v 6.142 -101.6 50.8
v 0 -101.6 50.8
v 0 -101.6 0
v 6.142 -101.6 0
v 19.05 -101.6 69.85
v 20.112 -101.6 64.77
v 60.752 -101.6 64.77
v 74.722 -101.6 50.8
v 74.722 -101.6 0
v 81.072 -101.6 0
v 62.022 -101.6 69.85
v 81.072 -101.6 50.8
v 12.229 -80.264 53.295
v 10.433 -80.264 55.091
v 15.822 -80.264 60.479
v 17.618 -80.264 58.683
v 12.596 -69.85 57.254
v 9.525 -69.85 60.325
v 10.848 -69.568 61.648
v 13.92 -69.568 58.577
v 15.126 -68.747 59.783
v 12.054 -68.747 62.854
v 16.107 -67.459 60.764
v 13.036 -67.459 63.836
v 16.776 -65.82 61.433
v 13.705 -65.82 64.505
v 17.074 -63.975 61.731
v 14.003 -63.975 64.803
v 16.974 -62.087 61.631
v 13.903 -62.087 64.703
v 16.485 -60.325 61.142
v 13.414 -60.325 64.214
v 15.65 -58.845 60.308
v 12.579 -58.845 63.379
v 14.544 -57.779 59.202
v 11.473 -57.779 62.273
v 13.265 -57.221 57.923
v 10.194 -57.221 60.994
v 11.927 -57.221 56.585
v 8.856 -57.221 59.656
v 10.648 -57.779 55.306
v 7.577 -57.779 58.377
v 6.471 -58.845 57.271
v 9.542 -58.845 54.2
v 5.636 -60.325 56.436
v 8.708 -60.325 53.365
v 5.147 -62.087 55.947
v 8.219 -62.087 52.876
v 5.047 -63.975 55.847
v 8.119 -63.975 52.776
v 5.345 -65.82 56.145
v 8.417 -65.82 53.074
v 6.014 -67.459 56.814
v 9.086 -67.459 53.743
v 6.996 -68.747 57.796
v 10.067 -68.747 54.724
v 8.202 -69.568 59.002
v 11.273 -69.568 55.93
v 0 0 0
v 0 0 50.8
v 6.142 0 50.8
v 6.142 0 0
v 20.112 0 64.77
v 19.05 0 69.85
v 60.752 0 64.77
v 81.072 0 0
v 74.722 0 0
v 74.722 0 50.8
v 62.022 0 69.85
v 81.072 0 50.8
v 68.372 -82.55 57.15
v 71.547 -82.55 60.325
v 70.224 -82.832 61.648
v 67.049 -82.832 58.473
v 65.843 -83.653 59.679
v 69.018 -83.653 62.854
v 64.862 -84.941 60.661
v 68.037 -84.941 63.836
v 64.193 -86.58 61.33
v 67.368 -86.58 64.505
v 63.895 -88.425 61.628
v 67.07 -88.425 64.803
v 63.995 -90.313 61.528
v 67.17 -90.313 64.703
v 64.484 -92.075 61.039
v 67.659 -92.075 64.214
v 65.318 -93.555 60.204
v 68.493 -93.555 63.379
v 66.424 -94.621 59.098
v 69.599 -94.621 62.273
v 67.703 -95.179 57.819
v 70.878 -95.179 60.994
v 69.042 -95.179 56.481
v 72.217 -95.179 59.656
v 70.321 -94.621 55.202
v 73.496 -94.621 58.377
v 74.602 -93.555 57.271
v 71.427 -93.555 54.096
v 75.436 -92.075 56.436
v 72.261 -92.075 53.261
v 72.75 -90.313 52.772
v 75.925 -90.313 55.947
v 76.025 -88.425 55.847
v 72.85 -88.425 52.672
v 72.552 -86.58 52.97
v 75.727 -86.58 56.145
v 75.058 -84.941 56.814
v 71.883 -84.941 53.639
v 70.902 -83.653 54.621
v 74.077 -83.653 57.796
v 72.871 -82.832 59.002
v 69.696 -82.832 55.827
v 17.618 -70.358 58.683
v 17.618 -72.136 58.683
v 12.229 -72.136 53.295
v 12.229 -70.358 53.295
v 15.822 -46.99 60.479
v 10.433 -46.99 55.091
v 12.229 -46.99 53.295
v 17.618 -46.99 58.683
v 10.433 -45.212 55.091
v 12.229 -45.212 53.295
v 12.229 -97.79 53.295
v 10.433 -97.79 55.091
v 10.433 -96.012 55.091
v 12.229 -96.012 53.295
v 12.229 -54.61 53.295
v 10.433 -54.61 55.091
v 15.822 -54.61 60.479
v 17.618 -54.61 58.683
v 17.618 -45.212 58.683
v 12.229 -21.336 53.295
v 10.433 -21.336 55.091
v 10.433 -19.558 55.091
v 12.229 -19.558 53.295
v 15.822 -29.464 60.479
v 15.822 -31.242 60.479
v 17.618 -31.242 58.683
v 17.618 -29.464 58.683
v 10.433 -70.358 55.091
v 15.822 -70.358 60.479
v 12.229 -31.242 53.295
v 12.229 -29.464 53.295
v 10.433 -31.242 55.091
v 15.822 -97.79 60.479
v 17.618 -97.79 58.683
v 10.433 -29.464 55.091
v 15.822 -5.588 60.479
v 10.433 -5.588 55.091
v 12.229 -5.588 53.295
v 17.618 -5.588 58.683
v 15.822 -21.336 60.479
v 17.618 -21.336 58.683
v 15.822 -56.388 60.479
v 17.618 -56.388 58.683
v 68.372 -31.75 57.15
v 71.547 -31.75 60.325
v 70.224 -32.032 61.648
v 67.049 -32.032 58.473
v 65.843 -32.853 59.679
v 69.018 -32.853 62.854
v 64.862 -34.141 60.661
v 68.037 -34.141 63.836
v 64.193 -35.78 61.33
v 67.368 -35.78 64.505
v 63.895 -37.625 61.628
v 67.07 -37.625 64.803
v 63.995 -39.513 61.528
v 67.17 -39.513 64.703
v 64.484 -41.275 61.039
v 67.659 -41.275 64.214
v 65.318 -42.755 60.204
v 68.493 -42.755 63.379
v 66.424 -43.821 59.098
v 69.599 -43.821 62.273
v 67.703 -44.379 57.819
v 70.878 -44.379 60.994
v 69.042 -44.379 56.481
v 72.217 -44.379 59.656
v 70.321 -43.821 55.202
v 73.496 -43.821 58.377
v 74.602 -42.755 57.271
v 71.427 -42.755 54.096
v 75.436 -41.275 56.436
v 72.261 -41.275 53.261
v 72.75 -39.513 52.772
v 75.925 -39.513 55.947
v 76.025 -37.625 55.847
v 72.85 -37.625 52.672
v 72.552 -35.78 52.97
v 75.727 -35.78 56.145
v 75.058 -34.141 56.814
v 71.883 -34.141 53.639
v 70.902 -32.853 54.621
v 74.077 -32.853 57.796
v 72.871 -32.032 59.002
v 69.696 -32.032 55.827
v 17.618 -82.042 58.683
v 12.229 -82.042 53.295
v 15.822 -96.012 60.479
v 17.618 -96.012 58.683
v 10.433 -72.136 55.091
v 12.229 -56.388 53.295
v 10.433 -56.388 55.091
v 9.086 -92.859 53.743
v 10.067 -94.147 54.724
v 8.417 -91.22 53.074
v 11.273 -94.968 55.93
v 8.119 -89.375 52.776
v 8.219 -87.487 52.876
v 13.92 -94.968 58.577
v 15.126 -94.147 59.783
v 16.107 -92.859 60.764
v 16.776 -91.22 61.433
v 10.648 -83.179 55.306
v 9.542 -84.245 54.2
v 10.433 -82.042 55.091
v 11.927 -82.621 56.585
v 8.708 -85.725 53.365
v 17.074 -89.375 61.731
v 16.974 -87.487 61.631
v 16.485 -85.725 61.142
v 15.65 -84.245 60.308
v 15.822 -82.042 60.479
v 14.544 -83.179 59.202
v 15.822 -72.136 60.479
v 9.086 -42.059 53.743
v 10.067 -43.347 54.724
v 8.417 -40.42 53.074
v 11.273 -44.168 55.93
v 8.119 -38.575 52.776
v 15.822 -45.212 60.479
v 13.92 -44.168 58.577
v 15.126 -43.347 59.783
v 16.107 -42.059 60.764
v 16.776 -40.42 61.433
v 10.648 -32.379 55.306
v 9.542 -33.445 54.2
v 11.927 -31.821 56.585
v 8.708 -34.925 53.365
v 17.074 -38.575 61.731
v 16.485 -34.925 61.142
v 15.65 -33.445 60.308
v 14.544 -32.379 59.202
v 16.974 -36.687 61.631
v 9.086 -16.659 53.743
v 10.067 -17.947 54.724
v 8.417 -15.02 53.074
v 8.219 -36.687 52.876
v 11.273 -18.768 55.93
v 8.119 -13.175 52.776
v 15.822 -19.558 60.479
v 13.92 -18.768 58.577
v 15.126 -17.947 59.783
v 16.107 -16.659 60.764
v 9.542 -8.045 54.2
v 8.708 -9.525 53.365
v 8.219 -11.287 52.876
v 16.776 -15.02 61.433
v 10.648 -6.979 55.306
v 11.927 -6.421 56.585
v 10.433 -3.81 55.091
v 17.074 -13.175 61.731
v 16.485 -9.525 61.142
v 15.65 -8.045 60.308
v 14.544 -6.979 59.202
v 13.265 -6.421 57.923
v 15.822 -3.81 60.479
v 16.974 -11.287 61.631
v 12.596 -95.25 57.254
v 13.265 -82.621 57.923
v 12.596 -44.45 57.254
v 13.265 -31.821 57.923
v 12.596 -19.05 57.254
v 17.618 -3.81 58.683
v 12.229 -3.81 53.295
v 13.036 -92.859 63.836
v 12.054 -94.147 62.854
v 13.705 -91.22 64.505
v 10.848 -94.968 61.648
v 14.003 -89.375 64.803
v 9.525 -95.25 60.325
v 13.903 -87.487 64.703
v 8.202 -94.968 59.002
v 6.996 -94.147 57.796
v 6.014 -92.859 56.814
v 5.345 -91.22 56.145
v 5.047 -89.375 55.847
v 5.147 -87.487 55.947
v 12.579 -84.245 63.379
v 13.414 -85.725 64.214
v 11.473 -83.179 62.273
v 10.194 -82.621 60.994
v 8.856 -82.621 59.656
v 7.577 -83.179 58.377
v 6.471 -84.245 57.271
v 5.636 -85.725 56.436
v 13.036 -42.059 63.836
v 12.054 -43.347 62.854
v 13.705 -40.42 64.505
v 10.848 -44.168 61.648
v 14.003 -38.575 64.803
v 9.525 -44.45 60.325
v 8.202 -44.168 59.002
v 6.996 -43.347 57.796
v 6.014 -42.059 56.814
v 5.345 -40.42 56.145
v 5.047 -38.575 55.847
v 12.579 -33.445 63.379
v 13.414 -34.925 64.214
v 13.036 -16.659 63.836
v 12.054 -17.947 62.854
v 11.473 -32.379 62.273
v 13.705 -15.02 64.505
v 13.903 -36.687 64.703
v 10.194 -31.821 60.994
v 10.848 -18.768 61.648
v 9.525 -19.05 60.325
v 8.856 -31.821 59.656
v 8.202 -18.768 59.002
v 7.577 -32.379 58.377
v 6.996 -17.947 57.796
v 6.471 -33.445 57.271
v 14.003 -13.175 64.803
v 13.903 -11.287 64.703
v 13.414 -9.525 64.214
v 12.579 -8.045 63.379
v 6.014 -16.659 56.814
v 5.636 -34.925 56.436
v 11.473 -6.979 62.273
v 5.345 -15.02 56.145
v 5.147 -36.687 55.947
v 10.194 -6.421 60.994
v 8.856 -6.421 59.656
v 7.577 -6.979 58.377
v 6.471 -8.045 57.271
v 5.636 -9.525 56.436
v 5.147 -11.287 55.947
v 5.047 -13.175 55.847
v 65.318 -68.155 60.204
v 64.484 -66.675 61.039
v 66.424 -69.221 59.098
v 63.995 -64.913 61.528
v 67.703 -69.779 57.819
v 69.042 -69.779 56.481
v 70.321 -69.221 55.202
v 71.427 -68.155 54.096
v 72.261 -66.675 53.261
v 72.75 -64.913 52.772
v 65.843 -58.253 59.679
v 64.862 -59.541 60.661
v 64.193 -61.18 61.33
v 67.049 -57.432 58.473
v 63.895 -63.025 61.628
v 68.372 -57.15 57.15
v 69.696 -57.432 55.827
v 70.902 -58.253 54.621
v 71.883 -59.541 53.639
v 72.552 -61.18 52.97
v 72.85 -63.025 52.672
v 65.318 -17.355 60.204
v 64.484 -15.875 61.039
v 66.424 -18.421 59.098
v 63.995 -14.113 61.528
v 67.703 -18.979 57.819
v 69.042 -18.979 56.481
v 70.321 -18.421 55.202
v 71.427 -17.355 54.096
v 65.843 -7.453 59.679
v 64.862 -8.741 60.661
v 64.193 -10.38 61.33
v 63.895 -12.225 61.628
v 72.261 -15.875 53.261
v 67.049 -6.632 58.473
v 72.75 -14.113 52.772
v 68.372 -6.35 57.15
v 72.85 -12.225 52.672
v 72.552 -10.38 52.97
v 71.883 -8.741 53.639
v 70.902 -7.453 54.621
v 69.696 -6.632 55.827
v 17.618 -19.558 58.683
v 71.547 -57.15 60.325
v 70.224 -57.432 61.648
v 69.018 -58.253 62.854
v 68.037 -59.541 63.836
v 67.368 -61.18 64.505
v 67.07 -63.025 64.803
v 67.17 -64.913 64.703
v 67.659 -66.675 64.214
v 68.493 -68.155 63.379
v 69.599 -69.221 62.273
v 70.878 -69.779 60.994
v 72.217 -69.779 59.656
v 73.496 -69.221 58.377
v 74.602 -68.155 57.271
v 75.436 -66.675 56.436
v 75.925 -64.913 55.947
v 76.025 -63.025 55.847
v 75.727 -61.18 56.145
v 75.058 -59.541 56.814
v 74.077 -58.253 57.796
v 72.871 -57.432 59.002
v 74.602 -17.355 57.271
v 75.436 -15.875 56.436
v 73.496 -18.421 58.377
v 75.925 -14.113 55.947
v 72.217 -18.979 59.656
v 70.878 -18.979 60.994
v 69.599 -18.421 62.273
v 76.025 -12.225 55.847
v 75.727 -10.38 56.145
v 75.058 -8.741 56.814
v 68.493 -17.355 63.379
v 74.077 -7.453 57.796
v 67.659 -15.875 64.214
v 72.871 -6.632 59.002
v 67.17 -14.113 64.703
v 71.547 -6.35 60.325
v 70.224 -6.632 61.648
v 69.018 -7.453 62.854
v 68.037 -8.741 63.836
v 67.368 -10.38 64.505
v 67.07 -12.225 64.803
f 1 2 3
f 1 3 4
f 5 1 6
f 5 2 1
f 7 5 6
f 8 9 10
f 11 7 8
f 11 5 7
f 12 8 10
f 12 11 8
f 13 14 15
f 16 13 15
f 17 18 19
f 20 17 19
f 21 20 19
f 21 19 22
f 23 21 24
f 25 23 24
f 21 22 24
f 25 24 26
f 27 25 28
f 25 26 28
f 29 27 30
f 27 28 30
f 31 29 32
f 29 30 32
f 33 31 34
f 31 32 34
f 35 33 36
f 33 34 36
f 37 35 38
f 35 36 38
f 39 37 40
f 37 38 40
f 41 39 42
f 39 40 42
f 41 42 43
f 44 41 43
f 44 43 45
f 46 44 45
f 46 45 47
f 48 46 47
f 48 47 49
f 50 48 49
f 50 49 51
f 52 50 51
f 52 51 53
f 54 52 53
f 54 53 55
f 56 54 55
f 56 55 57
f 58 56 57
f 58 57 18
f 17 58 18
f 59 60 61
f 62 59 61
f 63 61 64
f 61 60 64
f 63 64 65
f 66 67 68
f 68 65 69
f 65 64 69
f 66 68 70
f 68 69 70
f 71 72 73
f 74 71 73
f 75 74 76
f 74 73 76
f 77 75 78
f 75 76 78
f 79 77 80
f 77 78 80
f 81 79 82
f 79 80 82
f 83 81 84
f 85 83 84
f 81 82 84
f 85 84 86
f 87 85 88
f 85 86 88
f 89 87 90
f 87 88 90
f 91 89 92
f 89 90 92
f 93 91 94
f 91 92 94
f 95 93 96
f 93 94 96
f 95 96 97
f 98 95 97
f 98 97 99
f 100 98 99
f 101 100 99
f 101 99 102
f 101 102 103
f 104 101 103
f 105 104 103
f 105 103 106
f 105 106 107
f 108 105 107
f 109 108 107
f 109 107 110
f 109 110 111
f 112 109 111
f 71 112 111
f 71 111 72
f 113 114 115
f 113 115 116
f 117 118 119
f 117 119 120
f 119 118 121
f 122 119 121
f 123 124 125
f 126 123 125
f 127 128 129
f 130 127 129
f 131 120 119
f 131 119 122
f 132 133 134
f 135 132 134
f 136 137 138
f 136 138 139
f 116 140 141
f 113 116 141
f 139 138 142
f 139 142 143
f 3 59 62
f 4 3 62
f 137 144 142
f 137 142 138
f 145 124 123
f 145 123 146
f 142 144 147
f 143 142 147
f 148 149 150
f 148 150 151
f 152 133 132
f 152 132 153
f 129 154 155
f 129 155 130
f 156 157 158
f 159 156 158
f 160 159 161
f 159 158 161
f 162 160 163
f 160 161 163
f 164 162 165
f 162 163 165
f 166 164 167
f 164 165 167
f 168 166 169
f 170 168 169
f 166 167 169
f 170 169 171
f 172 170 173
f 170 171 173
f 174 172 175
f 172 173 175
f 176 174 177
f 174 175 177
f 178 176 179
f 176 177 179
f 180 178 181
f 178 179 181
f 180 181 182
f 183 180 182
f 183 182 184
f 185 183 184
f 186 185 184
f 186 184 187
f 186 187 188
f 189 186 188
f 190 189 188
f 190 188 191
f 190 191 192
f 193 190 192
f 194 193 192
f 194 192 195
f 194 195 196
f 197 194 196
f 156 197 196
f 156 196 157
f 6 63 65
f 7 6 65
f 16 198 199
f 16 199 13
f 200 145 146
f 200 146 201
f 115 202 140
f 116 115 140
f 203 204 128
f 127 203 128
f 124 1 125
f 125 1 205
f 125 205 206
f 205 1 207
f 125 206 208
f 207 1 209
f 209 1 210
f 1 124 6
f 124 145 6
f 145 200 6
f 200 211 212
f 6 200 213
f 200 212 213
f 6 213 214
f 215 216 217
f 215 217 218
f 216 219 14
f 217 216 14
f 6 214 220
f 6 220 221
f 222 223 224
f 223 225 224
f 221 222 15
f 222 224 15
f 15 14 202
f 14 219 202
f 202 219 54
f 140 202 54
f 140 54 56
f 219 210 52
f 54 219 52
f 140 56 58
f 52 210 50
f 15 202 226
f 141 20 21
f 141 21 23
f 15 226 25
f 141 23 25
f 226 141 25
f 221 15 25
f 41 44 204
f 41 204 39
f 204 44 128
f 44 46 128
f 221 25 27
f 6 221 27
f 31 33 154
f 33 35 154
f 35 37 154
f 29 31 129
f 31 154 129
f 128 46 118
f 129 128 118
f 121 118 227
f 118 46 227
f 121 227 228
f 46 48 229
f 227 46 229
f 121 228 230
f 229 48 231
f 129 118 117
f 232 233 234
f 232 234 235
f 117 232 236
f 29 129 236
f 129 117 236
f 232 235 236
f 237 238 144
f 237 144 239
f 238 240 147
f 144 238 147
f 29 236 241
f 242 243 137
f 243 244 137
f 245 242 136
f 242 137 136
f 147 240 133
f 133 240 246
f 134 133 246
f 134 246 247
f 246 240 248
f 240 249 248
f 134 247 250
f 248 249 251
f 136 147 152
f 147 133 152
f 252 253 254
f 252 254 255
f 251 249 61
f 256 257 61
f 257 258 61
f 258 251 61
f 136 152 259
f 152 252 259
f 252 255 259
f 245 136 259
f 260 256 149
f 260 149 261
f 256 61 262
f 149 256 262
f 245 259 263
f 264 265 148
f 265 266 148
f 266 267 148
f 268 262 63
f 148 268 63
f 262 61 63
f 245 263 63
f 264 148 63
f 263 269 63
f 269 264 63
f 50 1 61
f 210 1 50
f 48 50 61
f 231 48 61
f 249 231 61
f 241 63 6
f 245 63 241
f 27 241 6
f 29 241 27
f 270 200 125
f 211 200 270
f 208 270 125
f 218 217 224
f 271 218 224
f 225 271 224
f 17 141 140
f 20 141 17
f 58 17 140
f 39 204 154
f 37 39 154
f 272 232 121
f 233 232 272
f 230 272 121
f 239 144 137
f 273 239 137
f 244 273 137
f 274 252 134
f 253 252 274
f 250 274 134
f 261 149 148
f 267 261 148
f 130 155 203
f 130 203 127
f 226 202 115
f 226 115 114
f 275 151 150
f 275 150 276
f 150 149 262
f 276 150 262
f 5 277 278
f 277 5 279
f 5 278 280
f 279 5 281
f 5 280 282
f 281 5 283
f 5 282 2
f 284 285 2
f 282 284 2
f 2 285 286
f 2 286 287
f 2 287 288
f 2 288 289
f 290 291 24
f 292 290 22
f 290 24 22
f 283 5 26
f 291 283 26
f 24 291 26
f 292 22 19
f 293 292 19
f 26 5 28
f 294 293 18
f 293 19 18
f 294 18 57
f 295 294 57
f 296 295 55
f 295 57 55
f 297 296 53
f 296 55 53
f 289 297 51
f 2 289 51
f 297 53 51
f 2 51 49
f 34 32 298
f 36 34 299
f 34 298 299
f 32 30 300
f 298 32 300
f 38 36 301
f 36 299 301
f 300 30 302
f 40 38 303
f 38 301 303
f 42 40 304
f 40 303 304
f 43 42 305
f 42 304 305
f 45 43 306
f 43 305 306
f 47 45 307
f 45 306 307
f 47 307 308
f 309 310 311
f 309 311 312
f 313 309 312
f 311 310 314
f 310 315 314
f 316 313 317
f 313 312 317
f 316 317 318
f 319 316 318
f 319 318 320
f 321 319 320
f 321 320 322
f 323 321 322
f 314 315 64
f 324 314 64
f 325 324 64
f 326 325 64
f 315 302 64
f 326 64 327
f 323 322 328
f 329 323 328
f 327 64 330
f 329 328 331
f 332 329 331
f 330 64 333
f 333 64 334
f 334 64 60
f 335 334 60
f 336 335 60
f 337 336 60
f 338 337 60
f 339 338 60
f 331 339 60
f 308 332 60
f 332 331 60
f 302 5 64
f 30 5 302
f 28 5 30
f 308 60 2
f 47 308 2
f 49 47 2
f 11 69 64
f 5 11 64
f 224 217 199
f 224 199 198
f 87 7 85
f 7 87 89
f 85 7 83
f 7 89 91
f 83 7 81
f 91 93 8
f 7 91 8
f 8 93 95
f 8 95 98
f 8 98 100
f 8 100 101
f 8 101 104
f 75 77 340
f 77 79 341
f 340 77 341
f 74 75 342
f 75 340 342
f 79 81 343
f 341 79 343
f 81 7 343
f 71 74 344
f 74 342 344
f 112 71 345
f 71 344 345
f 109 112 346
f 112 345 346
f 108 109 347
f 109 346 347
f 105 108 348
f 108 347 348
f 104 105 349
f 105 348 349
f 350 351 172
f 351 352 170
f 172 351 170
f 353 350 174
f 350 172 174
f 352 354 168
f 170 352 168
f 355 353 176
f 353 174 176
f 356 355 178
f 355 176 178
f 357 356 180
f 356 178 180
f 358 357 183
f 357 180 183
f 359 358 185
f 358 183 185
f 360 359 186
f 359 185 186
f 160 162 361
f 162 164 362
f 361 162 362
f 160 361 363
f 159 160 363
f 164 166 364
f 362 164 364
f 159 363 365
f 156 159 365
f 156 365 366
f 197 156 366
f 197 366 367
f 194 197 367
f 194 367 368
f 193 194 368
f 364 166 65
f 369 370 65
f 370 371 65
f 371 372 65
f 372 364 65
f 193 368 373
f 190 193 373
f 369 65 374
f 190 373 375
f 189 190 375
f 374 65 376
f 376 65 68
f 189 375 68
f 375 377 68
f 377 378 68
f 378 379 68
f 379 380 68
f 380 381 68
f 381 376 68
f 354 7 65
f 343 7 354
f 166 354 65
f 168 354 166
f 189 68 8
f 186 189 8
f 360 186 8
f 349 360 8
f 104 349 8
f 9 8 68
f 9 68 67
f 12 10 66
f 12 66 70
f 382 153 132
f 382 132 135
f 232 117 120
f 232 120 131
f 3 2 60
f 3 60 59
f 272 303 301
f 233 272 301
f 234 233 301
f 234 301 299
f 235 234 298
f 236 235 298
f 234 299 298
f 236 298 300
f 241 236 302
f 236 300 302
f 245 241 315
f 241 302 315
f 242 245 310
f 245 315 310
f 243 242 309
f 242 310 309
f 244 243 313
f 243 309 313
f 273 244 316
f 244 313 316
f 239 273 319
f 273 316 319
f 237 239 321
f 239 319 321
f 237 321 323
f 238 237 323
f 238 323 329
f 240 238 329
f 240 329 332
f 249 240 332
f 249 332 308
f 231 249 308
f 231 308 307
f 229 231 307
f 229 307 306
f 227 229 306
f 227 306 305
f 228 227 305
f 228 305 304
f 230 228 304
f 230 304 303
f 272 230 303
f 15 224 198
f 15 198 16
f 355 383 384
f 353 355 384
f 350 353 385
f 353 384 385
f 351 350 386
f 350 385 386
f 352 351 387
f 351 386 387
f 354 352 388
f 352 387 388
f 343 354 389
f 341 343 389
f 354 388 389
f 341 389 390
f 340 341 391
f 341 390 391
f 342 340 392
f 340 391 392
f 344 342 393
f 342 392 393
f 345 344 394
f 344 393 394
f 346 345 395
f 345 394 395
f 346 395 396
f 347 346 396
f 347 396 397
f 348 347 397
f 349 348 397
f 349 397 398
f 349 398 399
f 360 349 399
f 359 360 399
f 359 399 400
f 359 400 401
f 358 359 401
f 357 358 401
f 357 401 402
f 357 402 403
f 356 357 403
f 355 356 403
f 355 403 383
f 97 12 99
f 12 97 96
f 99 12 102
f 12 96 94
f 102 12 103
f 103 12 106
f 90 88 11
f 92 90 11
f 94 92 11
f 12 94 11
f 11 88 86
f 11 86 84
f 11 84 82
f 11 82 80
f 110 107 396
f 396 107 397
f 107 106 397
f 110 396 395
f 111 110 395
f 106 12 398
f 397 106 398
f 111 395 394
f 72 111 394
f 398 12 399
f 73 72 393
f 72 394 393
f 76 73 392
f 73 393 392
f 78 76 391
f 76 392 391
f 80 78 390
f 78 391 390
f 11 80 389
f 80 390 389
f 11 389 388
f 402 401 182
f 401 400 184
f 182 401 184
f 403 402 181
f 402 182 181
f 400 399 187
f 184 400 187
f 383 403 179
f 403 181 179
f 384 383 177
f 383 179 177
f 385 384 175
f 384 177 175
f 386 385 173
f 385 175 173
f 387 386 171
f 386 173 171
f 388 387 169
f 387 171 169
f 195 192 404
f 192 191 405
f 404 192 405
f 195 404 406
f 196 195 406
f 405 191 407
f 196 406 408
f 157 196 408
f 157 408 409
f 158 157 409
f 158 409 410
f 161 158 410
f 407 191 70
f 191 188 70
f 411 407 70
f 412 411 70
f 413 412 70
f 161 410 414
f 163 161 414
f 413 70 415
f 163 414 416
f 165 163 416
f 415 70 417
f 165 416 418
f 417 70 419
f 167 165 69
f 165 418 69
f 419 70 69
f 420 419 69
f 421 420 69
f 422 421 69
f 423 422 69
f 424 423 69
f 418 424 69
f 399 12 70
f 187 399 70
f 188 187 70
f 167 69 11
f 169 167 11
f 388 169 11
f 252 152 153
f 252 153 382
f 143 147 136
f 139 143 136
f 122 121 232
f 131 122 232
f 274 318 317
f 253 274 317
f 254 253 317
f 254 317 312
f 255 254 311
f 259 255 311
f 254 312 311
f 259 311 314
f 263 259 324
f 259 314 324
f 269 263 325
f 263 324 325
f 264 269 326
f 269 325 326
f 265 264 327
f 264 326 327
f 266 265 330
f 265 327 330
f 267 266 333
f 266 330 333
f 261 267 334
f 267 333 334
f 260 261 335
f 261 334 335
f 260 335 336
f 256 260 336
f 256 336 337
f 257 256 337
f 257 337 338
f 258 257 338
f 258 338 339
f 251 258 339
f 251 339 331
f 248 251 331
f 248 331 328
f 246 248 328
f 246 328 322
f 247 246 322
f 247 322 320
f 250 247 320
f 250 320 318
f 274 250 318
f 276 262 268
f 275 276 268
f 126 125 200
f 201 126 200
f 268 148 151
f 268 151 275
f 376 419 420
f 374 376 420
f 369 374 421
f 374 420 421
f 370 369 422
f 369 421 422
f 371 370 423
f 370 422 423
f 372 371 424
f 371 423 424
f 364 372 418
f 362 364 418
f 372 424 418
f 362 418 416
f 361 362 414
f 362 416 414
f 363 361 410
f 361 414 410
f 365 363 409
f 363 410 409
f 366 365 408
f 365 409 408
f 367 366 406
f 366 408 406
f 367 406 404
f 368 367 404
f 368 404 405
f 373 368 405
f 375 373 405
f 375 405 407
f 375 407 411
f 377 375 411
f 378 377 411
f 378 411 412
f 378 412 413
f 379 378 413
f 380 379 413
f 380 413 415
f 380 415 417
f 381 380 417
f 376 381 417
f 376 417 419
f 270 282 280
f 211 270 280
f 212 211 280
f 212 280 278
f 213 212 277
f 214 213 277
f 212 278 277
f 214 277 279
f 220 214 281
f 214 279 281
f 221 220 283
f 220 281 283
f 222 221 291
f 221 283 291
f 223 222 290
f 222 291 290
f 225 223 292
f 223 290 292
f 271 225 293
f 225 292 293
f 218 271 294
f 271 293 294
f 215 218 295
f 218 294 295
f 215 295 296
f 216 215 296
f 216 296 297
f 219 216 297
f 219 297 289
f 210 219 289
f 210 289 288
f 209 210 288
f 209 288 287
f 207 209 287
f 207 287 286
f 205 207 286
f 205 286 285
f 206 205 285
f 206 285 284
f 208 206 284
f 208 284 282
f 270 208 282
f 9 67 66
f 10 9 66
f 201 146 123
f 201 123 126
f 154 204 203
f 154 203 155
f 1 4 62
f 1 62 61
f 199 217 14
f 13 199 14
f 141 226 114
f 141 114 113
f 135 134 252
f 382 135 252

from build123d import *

# Parameters (mm, degrees)
F1_DEPTH = 101.6
F2_R     = 6.35
F3_DEPTH = 25.4
F4_R     = 6.35
F5_DEPTH = 25.4
F6_W     = 1.778
F6_H     = 7.62
F7_DEPTH = 2.54


with BuildPart() as f1:
    # F0 (on Front) → F1 (new body)
    with BuildSketch(Plane.XZ):
        Polygon((62.0224951868, 69.85), (19.05, 69.85), (0, 50.8), (0, 0), (6.1424951868, 0), (6.1424951868, 50.8), (20.1124951868, 64.77), (60.7524951868, 64.77), (74.7224951868, 50.8), (74.7224951868, 0), (81.0724951868, 0), (81.0724951868, 50.8), align=None)
    extrude(amount=F1_DEPTH)

    # F2 (on face) → F3 (cut)
    with BuildSketch(Plane(origin=(65.9362475934, 0, 65.9362475934), x_dir=(0, 1, 0), z_dir=(0.7071067812, 0, 0.7071067812))):
        with Locations((-12.7, -7.9355024484)):
            Circle(F2_R)
        with Locations((-38.1, -7.9355024484)):
            Circle(F2_R)
        with Locations((-63.5, -7.9355024484)):
            Circle(F2_R)
        with Locations((-88.9, -7.9355024484)):
            Circle(F2_R)
    extrude(amount=-F3_DEPTH, mode=Mode.SUBTRACT)

    # F4 (on face) → F5 (cut)
    with BuildSketch(Plane(origin=(-25.4, 0, 25.4), x_dir=(0, -1, 0), z_dir=(-0.7071067812, 0, 0.7071067812))):
        with Locations((88.9, 49.3914086659)):
            Circle(F4_R)
        with Locations((63.5, 49.3914086659)):
            Circle(F4_R)
        with Locations((38.1, 49.3914086659)):
            Circle(F4_R)
        with Locations((12.7, 49.3914086659)):
            Circle(F4_R)
    extrude(amount=-F5_DEPTH, mode=Mode.SUBTRACT)

    # F6 (on face) → F7 (join)
    with BuildSketch(Plane(origin=(-22.3287524066, 0, 22.3287524066), x_dir=(0, 1, 0), z_dir=(0.7071067812, 0, -0.7071067812))):
        with Locations((-96.901, 50.1427062175)):
            Rectangle(F6_W, F6_H)
        with Locations((-81.153, 50.1427062175)):
            Rectangle(F6_W, F6_H)
        with Locations((-71.247, 50.1427062175)):
            Rectangle(F6_W, F6_H)
        with Locations((-55.499, 50.1427062175)):
            Rectangle(F6_W, F6_H)
        with Locations((-46.101, 50.1427062175)):
            Rectangle(F6_W, F6_H)
        with Locations((-30.353, 50.1427062175)):
            Rectangle(F6_W, F6_H)
        with Locations((-20.447, 50.1427062175)):
            Rectangle(F6_W, F6_H)
        with Locations((-4.699, 50.1427062175)):
            Rectangle(F6_W, F6_H)
    extrude(amount=F7_DEPTH)


solid = f1.part
